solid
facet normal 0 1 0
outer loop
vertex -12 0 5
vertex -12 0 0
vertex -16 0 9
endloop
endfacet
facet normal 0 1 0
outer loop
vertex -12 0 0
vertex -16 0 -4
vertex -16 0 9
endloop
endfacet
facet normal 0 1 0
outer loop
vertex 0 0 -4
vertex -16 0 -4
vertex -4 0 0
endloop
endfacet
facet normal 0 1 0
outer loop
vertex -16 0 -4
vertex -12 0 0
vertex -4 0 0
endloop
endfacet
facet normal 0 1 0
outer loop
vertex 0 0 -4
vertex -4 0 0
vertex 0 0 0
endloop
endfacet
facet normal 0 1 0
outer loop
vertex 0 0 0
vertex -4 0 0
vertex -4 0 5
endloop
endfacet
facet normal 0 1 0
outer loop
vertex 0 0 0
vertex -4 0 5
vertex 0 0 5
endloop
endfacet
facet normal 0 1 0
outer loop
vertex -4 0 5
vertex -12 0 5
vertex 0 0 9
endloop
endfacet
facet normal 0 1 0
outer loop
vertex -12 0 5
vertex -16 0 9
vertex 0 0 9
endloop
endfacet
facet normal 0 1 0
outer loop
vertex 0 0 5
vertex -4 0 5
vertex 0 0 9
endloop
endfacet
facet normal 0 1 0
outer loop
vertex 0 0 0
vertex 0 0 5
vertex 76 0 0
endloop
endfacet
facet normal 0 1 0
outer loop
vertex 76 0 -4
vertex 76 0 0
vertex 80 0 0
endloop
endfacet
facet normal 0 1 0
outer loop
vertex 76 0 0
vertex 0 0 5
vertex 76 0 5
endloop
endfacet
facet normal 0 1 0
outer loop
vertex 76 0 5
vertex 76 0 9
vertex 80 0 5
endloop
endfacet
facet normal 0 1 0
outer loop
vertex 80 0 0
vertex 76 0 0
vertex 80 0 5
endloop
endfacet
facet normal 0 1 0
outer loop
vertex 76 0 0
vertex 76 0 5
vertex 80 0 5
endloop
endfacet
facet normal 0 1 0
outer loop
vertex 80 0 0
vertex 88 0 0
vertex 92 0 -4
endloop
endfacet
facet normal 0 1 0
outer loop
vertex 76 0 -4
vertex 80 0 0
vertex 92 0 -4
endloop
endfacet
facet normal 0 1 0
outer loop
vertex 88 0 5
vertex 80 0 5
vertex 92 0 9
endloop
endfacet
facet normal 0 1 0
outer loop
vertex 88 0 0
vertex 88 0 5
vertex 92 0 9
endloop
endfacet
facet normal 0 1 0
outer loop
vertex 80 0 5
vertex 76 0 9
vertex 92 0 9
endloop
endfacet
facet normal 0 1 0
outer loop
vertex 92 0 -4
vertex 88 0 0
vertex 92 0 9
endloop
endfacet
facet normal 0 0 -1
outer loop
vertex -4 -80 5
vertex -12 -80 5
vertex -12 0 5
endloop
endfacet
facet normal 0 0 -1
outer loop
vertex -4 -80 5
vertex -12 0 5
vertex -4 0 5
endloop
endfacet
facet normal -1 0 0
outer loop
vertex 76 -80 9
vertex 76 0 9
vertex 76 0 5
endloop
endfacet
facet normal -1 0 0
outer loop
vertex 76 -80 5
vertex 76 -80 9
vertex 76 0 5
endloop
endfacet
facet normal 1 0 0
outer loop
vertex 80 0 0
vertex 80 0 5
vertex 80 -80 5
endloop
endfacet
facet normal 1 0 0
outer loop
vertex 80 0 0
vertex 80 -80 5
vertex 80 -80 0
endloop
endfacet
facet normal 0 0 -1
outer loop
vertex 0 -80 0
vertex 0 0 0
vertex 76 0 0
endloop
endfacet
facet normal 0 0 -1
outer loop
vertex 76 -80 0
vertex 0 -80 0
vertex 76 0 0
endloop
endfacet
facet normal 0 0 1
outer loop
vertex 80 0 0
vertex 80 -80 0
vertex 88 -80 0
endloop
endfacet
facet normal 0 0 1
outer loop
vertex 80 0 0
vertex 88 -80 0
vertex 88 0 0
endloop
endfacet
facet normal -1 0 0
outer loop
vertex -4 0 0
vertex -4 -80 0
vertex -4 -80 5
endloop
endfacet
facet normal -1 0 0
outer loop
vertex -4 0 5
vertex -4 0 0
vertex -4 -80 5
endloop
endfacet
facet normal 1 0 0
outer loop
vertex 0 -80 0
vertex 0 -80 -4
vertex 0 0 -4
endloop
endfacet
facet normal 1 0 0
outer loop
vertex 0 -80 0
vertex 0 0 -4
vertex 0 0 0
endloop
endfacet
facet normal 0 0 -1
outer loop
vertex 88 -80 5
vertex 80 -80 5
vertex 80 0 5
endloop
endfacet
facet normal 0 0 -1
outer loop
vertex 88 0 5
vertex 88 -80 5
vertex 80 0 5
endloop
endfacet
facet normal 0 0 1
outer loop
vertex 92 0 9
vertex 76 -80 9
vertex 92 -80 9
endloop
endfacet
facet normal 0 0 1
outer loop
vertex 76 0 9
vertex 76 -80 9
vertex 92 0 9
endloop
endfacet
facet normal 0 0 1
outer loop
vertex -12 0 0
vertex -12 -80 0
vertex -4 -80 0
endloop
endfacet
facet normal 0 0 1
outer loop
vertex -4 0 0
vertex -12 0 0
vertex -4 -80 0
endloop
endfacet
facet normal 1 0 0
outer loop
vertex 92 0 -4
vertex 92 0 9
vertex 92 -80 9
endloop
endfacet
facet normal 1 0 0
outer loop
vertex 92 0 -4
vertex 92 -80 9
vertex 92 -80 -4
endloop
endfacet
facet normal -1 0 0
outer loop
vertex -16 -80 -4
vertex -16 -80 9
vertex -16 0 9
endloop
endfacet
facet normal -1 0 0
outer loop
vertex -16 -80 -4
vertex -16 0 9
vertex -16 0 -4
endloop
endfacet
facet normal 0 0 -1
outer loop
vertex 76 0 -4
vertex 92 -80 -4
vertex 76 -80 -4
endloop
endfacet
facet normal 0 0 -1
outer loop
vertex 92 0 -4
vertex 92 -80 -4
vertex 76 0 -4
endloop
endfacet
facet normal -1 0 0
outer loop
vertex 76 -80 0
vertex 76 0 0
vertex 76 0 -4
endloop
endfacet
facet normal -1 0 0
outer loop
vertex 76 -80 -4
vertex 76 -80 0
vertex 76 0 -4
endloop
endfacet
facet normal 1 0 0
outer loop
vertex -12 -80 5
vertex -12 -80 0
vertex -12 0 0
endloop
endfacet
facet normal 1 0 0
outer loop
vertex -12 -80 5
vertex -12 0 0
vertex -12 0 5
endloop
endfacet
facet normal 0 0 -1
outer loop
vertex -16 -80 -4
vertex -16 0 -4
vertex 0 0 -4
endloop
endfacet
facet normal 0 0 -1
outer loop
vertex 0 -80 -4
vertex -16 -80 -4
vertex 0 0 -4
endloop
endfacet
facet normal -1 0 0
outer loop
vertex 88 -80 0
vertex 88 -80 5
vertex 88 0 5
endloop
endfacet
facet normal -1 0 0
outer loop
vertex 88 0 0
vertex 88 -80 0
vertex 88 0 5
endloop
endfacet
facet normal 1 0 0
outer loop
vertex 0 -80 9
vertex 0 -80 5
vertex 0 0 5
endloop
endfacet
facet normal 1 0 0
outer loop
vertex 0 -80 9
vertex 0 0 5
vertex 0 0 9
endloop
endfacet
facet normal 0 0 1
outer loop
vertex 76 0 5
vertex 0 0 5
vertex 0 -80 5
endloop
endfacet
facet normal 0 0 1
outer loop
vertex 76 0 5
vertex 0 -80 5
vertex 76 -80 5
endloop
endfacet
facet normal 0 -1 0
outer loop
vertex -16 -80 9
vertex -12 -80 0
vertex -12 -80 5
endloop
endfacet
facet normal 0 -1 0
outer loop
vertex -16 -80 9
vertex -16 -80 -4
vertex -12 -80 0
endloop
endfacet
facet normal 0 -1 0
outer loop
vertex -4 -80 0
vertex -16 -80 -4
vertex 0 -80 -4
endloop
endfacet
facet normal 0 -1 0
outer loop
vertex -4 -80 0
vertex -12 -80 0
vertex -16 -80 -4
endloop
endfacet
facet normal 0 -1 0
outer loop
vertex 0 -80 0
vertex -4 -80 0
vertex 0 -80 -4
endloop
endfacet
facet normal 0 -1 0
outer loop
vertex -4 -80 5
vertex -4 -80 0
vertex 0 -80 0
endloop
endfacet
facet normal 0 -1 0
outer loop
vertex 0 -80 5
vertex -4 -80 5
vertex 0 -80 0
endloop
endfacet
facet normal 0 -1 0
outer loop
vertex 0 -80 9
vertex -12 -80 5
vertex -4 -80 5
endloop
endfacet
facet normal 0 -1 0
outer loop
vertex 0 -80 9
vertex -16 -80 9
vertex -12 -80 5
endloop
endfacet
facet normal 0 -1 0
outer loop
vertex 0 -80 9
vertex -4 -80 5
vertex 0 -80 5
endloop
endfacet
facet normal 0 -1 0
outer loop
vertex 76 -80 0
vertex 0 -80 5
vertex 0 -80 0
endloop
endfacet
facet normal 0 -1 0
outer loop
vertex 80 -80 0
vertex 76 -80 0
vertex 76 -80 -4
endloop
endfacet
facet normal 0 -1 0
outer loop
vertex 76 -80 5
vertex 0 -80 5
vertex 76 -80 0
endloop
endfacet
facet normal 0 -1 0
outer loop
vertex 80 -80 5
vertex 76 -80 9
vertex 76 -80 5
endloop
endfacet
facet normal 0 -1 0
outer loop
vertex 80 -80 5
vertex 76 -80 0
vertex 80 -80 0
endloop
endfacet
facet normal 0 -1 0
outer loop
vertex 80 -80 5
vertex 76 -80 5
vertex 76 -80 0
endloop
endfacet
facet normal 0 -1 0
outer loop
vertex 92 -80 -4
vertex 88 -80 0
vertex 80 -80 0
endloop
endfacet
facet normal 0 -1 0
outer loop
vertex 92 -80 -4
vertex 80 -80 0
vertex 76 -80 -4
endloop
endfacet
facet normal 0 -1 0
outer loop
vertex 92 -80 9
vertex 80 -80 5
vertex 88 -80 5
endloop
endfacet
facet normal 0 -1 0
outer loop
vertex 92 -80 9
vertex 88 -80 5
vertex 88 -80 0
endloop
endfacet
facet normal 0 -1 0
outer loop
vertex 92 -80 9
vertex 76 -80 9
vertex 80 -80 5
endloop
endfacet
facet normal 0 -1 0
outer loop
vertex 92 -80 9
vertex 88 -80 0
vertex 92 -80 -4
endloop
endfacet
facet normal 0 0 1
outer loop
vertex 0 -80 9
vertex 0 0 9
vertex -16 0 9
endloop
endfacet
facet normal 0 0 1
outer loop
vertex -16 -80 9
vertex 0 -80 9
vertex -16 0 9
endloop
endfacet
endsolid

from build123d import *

# Parameters (mm, degrees)
SKETCH_1_W      = 80
SKETCH_1_H      = 80
EXTRUDE_1_DEPTH = 5
SKETCH_2_W      = 4
SKETCH_2_H      = 80
EXTRUDE_2_DEPTH = 4
SKETCH_2_2_W    = 4
SKETCH_2_2_H    = 80
EXTRUDE_3_DEPTH = 12
SKETCH_3_W      = 4
SKETCH_3_H      = 80
EXTRUDE_4_DEPTH = 9
SKETCH_6_W      = 8
SKETCH_6_H      = 5
EXTRUDE_5_DEPTH = 80


with BuildPart() as part:
    # 草图1 → 凸台-拉伸1 (new body)
    with BuildSketch(Plane.XY):
        with Locations((40, -40)):
            Rectangle(SKETCH_1_W, SKETCH_1_H)
    extrude(amount=EXTRUDE_1_DEPTH)

    # 草图2 → 凸台-拉伸2 (add)
    with BuildSketch(Plane(origin=(80, 0, 0), x_dir=(0, 0, -1), z_dir=(1, 0, 0))):
        with Locations((-7, -40)):
            Rectangle(SKETCH_2_W, SKETCH_2_H)
        with Locations((2, -40)):
            Rectangle(SKETCH_2_W, SKETCH_2_H)
    extrude(amount=-EXTRUDE_2_DEPTH)

    # 草图2<2> → 凸台-拉伸3 (add)
    with BuildSketch(Plane(origin=(80, 0, 0), x_dir=(0, 0, -1), z_dir=(1, 0, 0))):
        with Locations((-7, -40)):
            Rectangle(SKETCH_2_2_W, SKETCH_2_2_H)
        with Locations((2, -40)):
            Rectangle(SKETCH_2_2_W, SKETCH_2_2_H)
    extrude(amount=EXTRUDE_3_DEPTH)

    # 草图3 → 凸台-拉伸4 (add)
    with BuildSketch(Plane.XY.offset(9)):
        with Locations((90, -40)):
            Rectangle(SKETCH_3_W, SKETCH_3_H)
    extrude(amount=-EXTRUDE_4_DEPTH)

    # 草图6 → 凸台-拉伸5 (add)
    with BuildSketch(Plane.XZ.offset(80)):
        Polygon((-16, -4), (0, -4), (0, 0), (0, 5), (0, 9), (-16, 9), align=None)
        with Locations((-8, 2.5)):
            Rectangle(SKETCH_6_W, SKETCH_6_H, mode=Mode.SUBTRACT)
    extrude(amount=-EXTRUDE_5_DEPTH)


solid = part.part
